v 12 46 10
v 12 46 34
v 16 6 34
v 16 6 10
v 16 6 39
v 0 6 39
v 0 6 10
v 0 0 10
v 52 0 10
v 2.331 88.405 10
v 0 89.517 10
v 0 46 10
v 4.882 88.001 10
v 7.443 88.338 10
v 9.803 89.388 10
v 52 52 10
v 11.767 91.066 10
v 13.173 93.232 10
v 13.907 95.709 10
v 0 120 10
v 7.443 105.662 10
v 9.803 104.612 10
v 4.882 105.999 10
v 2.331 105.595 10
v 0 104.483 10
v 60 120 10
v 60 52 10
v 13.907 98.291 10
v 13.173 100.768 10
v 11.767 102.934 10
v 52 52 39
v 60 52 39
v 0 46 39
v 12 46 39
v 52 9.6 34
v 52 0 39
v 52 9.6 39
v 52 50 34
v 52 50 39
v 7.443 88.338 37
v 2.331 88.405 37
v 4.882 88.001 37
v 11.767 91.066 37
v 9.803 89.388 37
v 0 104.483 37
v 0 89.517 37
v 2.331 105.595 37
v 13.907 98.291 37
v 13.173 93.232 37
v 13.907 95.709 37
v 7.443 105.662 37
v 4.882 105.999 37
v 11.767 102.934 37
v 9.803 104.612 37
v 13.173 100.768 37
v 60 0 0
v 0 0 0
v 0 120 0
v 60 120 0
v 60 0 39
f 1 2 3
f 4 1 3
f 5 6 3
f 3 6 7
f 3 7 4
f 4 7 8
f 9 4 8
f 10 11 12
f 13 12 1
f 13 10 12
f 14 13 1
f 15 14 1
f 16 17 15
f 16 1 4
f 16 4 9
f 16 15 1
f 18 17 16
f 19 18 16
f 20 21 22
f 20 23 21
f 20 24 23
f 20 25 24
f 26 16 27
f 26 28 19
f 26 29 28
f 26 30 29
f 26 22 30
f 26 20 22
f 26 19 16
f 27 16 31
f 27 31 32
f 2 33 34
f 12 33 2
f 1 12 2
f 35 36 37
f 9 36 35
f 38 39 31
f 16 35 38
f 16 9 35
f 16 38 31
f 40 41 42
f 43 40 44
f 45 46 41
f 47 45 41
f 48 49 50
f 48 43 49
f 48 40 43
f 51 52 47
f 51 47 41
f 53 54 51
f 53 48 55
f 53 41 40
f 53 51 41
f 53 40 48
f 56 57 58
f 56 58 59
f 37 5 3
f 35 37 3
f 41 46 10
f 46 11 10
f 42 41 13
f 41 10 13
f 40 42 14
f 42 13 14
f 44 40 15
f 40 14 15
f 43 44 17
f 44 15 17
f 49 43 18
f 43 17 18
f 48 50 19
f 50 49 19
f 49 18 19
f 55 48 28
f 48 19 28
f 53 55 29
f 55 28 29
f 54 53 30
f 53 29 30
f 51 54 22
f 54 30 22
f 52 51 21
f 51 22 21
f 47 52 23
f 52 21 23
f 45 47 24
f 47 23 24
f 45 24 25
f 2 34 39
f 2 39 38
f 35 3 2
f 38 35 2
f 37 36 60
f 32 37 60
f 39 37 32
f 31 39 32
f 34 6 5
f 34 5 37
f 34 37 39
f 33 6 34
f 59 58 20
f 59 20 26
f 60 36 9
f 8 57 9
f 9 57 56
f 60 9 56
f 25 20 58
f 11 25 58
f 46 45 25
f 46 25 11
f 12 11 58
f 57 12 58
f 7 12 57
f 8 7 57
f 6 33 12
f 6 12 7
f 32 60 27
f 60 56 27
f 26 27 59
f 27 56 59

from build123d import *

# Parameters (mm, degrees)
SKETCH1_W           = 60
SKETCH1_H           = 120
BOSS_EXTRUDE1_DEPTH = 10
SKETCH3_R           = 9
BOSS_EXTRUDE3_DEPTH = 27
CUT_EXTRUDE1_DEPTH  = 38
SKETCH5_W           = 16
SKETCH5_H           = 40
BOSS_EXTRUDE4_DEPTH = 29
SKETCH2_W           = 8
SKETCH2_H           = 52
BOSS_EXTRUDE5_DEPTH = 29
CUT_EXTRUDE2_DEPTH  = 29
SKETCH9_W           = 5
SKETCH9_H           = 40.199502484
BOSS_EXTRUDE6_DEPTH = 42


with BuildPart() as part:
    # Sketch1 → Boss-Extrude1 (new body)
    with BuildSketch(Plane.XY):
        with Locations((30, 60)):
            Rectangle(SKETCH1_W, SKETCH1_H)
    extrude(amount=BOSS_EXTRUDE1_DEPTH)

    # Sketch3 → Boss-Extrude3 (add)
    with BuildSketch(Plane.XY.offset(10)):
        with Locations((5, 97)):
            Circle(SKETCH3_R)
    extrude(amount=BOSS_EXTRUDE3_DEPTH)

    # Sketch4 → Cut-Extrude1 (cut, through all)
    with BuildSketch(Plane.XY.offset(37)):
        Polygon((0, 104.483314774), (0, 89.516685226), (-21.075421501, 89.516685226), (-21.075421501, 106.99834991), align=None)
    extrude(amount=-CUT_EXTRUDE1_DEPTH, mode=Mode.SUBTRACT)

    # Sketch5 → Boss-Extrude4 (add)
    with BuildSketch(Plane.XY.offset(10)):
        with Locations((8, 26)):
            Rectangle(SKETCH5_W, SKETCH5_H)
    extrude(amount=BOSS_EXTRUDE4_DEPTH)

    # Sketch2 → Boss-Extrude5 (add)
    with BuildSketch(Plane.XY.offset(10)):
        with Locations((56, 26)):
            Rectangle(SKETCH2_W, SKETCH2_H)
    extrude(amount=BOSS_EXTRUDE5_DEPTH)

    # Sketch8 → Cut-Extrude2 (cut)
    with BuildSketch(Plane.XY.offset(39)):
        Polygon((16, 46), (12, 46), (16, 6), align=None)
    extrude(amount=-CUT_EXTRUDE2_DEPTH, mode=Mode.SUBTRACT)

    # Sketch9 → Boss-Extrude6 (add)
    with BuildSketch(Plane(origin=(16.435643564, 1.643564356, 0), x_dir=(0, 0, -1), z_dir=(0.99503719, 0.099503719, 0))):
        with Locations((-36.5, 24.477914879)):
            Rectangle(SKETCH9_W, SKETCH9_H)
    extrude(amount=BOSS_EXTRUDE6_DEPTH)


solid = part.part
